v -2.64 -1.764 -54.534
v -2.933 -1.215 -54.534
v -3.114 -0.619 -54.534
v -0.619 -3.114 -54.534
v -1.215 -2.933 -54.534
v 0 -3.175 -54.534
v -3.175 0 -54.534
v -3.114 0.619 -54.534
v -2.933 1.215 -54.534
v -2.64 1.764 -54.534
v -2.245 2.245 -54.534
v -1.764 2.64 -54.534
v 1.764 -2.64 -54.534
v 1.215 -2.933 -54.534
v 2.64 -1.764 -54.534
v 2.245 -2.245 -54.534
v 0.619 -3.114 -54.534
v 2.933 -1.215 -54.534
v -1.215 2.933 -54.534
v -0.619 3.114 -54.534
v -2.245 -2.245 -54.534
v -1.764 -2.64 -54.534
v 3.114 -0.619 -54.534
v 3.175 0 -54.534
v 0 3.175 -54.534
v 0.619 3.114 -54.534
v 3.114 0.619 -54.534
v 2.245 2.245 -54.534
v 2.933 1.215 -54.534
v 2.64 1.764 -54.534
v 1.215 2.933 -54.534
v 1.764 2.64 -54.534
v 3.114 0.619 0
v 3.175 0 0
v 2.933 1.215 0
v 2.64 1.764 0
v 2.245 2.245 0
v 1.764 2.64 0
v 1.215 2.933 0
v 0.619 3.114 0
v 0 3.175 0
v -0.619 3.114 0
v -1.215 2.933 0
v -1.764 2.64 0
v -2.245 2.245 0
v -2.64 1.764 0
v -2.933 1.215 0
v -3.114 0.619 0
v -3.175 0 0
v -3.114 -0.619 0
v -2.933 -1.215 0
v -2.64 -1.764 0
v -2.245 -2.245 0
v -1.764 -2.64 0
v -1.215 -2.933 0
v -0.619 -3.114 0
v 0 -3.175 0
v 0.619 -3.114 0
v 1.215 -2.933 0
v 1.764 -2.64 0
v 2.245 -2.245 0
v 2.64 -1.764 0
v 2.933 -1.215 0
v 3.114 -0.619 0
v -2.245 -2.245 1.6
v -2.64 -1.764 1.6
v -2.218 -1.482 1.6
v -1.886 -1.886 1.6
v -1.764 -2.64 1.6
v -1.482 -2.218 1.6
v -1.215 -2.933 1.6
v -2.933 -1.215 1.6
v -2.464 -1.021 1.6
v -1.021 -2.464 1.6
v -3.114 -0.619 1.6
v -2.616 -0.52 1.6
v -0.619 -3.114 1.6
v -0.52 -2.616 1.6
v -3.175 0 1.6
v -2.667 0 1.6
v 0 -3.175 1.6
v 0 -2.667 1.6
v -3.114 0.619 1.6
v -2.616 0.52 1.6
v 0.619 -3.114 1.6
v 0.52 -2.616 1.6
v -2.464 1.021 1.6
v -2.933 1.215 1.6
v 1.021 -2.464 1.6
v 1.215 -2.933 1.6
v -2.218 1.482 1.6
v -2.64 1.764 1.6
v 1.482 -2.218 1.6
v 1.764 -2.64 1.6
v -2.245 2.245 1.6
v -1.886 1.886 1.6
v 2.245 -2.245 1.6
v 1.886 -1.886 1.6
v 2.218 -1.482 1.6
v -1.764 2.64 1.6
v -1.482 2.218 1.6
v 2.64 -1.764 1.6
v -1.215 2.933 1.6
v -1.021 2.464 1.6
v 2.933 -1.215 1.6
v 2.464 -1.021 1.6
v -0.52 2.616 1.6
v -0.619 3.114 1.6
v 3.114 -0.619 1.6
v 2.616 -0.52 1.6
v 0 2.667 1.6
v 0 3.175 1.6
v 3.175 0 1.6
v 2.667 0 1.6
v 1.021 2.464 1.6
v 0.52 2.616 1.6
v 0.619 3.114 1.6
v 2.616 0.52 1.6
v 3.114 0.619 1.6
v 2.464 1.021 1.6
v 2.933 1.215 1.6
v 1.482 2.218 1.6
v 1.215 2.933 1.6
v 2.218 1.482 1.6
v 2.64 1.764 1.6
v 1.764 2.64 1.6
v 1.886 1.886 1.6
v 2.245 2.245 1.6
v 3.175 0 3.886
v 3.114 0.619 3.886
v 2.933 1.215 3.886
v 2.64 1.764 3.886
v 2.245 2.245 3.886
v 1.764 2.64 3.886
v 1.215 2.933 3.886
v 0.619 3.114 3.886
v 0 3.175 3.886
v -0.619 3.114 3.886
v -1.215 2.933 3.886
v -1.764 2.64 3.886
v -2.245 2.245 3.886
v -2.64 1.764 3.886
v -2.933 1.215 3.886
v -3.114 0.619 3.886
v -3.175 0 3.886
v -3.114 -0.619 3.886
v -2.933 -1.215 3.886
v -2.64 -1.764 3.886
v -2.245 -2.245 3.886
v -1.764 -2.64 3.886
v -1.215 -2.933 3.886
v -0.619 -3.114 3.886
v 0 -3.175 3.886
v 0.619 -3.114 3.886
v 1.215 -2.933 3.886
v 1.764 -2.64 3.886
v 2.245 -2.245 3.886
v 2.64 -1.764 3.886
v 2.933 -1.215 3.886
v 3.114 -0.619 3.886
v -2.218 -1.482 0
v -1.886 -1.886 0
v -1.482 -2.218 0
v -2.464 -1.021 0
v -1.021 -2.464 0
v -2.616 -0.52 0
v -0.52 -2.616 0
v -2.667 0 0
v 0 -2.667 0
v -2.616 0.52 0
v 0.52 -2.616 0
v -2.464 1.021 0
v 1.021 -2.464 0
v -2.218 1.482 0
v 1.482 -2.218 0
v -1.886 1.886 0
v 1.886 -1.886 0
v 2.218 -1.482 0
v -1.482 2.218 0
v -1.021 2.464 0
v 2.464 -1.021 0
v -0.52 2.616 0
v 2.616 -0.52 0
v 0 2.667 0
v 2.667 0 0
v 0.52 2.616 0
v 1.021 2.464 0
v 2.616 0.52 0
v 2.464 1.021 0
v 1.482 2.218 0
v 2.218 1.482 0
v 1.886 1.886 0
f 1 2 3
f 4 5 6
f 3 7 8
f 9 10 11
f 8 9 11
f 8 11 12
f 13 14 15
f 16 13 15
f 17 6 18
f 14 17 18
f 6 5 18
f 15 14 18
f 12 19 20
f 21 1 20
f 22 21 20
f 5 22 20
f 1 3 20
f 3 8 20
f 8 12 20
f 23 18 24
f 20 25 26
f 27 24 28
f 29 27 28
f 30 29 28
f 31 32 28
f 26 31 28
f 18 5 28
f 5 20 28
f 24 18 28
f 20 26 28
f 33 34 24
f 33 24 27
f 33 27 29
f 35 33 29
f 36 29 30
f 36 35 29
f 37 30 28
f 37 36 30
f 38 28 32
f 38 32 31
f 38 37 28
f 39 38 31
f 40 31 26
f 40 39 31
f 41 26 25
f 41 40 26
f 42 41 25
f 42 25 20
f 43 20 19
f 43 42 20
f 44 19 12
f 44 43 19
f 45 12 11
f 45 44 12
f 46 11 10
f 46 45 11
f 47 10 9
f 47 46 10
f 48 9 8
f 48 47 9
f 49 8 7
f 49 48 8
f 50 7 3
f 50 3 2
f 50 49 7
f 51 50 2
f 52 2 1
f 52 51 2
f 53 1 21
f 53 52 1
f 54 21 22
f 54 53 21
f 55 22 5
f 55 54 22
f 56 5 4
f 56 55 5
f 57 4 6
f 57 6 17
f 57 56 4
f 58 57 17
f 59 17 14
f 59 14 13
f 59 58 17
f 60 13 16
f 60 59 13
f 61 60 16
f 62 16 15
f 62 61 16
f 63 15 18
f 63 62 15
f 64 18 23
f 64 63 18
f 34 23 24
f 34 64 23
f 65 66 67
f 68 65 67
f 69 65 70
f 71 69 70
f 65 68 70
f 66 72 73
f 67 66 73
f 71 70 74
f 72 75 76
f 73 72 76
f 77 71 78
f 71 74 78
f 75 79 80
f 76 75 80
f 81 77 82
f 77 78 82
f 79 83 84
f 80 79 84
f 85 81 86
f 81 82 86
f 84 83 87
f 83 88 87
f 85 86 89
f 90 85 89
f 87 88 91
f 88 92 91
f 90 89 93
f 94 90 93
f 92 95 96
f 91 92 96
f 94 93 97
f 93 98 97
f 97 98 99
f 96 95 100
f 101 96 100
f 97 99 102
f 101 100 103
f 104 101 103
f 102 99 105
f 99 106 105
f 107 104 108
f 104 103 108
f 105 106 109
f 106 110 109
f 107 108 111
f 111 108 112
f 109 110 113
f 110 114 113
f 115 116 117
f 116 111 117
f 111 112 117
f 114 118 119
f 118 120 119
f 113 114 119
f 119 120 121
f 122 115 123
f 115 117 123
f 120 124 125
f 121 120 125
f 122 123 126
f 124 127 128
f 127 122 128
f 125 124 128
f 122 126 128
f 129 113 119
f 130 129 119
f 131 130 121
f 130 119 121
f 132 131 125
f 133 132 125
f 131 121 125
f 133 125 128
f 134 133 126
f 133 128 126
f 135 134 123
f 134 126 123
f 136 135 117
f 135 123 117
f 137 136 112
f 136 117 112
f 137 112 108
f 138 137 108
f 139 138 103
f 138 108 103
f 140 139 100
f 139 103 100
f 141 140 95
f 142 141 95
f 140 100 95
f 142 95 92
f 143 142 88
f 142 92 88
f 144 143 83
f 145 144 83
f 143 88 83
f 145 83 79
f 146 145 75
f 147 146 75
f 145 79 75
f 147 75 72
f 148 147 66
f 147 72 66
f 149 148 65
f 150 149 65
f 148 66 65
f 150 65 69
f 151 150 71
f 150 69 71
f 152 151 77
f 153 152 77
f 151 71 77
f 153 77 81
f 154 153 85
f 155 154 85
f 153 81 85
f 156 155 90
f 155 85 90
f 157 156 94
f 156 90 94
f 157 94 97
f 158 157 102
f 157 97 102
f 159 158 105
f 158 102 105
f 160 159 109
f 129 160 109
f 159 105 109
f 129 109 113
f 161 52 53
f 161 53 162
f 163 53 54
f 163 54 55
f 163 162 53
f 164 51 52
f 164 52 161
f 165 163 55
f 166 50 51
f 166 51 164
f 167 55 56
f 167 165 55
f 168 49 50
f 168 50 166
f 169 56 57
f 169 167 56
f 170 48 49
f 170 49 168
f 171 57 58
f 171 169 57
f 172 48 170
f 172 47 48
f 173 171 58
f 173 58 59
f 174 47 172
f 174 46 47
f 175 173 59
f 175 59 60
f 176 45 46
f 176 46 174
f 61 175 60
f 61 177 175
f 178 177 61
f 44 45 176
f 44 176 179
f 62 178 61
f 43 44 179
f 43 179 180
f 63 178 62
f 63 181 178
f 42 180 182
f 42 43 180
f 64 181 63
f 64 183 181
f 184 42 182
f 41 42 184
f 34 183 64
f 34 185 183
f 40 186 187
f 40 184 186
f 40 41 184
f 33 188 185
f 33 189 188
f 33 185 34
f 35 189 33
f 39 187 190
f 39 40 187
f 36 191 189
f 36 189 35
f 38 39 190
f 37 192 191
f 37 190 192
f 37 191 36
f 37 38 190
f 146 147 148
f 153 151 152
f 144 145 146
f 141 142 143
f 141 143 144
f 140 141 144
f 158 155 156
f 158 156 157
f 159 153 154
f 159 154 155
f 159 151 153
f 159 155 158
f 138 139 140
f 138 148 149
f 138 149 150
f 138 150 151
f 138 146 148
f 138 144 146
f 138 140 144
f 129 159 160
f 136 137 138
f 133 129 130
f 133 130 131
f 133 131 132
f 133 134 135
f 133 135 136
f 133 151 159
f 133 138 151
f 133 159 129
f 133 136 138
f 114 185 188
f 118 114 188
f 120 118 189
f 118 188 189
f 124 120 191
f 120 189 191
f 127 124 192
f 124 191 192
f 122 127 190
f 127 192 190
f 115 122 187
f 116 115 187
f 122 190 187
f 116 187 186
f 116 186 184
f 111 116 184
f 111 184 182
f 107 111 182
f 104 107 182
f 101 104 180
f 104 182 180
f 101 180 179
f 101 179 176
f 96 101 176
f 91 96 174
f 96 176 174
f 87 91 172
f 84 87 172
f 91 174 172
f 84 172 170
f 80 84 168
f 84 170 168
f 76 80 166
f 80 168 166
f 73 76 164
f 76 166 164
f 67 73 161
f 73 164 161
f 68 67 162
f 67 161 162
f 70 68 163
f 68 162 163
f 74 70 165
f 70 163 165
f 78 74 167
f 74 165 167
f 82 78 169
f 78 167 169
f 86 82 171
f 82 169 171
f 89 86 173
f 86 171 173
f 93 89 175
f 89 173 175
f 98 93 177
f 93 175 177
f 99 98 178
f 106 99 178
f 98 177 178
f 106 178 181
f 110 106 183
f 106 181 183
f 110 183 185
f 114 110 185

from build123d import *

# Parameters (mm, degrees)
SKETCH1_R           = 3.175
BOSS_EXTRUDE1_DEPTH = 54.5338
SKETCH2_R           = 2.667
BOSS_EXTRUDE2_DEPTH = 1.6002
SKETCH3_R           = 3.175
BOSS_EXTRUDE3_DEPTH = 2.286


with BuildPart() as part:
    # Sketch1 → Boss-Extrude1 (new body)
    with BuildSketch(Plane.XY):
        Circle(SKETCH1_R)
    extrude(amount=-BOSS_EXTRUDE1_DEPTH)

    # Sketch2 → Boss-Extrude2 (add)
    with BuildSketch(Plane.XY):
        Circle(SKETCH2_R)
    extrude(amount=BOSS_EXTRUDE2_DEPTH)

    # Sketch3 → Boss-Extrude3 (add)
    with BuildSketch(Plane.XY.offset(1.6002)):
        Circle(SKETCH3_R)
    extrude(amount=BOSS_EXTRUDE3_DEPTH)


solid = part.part
